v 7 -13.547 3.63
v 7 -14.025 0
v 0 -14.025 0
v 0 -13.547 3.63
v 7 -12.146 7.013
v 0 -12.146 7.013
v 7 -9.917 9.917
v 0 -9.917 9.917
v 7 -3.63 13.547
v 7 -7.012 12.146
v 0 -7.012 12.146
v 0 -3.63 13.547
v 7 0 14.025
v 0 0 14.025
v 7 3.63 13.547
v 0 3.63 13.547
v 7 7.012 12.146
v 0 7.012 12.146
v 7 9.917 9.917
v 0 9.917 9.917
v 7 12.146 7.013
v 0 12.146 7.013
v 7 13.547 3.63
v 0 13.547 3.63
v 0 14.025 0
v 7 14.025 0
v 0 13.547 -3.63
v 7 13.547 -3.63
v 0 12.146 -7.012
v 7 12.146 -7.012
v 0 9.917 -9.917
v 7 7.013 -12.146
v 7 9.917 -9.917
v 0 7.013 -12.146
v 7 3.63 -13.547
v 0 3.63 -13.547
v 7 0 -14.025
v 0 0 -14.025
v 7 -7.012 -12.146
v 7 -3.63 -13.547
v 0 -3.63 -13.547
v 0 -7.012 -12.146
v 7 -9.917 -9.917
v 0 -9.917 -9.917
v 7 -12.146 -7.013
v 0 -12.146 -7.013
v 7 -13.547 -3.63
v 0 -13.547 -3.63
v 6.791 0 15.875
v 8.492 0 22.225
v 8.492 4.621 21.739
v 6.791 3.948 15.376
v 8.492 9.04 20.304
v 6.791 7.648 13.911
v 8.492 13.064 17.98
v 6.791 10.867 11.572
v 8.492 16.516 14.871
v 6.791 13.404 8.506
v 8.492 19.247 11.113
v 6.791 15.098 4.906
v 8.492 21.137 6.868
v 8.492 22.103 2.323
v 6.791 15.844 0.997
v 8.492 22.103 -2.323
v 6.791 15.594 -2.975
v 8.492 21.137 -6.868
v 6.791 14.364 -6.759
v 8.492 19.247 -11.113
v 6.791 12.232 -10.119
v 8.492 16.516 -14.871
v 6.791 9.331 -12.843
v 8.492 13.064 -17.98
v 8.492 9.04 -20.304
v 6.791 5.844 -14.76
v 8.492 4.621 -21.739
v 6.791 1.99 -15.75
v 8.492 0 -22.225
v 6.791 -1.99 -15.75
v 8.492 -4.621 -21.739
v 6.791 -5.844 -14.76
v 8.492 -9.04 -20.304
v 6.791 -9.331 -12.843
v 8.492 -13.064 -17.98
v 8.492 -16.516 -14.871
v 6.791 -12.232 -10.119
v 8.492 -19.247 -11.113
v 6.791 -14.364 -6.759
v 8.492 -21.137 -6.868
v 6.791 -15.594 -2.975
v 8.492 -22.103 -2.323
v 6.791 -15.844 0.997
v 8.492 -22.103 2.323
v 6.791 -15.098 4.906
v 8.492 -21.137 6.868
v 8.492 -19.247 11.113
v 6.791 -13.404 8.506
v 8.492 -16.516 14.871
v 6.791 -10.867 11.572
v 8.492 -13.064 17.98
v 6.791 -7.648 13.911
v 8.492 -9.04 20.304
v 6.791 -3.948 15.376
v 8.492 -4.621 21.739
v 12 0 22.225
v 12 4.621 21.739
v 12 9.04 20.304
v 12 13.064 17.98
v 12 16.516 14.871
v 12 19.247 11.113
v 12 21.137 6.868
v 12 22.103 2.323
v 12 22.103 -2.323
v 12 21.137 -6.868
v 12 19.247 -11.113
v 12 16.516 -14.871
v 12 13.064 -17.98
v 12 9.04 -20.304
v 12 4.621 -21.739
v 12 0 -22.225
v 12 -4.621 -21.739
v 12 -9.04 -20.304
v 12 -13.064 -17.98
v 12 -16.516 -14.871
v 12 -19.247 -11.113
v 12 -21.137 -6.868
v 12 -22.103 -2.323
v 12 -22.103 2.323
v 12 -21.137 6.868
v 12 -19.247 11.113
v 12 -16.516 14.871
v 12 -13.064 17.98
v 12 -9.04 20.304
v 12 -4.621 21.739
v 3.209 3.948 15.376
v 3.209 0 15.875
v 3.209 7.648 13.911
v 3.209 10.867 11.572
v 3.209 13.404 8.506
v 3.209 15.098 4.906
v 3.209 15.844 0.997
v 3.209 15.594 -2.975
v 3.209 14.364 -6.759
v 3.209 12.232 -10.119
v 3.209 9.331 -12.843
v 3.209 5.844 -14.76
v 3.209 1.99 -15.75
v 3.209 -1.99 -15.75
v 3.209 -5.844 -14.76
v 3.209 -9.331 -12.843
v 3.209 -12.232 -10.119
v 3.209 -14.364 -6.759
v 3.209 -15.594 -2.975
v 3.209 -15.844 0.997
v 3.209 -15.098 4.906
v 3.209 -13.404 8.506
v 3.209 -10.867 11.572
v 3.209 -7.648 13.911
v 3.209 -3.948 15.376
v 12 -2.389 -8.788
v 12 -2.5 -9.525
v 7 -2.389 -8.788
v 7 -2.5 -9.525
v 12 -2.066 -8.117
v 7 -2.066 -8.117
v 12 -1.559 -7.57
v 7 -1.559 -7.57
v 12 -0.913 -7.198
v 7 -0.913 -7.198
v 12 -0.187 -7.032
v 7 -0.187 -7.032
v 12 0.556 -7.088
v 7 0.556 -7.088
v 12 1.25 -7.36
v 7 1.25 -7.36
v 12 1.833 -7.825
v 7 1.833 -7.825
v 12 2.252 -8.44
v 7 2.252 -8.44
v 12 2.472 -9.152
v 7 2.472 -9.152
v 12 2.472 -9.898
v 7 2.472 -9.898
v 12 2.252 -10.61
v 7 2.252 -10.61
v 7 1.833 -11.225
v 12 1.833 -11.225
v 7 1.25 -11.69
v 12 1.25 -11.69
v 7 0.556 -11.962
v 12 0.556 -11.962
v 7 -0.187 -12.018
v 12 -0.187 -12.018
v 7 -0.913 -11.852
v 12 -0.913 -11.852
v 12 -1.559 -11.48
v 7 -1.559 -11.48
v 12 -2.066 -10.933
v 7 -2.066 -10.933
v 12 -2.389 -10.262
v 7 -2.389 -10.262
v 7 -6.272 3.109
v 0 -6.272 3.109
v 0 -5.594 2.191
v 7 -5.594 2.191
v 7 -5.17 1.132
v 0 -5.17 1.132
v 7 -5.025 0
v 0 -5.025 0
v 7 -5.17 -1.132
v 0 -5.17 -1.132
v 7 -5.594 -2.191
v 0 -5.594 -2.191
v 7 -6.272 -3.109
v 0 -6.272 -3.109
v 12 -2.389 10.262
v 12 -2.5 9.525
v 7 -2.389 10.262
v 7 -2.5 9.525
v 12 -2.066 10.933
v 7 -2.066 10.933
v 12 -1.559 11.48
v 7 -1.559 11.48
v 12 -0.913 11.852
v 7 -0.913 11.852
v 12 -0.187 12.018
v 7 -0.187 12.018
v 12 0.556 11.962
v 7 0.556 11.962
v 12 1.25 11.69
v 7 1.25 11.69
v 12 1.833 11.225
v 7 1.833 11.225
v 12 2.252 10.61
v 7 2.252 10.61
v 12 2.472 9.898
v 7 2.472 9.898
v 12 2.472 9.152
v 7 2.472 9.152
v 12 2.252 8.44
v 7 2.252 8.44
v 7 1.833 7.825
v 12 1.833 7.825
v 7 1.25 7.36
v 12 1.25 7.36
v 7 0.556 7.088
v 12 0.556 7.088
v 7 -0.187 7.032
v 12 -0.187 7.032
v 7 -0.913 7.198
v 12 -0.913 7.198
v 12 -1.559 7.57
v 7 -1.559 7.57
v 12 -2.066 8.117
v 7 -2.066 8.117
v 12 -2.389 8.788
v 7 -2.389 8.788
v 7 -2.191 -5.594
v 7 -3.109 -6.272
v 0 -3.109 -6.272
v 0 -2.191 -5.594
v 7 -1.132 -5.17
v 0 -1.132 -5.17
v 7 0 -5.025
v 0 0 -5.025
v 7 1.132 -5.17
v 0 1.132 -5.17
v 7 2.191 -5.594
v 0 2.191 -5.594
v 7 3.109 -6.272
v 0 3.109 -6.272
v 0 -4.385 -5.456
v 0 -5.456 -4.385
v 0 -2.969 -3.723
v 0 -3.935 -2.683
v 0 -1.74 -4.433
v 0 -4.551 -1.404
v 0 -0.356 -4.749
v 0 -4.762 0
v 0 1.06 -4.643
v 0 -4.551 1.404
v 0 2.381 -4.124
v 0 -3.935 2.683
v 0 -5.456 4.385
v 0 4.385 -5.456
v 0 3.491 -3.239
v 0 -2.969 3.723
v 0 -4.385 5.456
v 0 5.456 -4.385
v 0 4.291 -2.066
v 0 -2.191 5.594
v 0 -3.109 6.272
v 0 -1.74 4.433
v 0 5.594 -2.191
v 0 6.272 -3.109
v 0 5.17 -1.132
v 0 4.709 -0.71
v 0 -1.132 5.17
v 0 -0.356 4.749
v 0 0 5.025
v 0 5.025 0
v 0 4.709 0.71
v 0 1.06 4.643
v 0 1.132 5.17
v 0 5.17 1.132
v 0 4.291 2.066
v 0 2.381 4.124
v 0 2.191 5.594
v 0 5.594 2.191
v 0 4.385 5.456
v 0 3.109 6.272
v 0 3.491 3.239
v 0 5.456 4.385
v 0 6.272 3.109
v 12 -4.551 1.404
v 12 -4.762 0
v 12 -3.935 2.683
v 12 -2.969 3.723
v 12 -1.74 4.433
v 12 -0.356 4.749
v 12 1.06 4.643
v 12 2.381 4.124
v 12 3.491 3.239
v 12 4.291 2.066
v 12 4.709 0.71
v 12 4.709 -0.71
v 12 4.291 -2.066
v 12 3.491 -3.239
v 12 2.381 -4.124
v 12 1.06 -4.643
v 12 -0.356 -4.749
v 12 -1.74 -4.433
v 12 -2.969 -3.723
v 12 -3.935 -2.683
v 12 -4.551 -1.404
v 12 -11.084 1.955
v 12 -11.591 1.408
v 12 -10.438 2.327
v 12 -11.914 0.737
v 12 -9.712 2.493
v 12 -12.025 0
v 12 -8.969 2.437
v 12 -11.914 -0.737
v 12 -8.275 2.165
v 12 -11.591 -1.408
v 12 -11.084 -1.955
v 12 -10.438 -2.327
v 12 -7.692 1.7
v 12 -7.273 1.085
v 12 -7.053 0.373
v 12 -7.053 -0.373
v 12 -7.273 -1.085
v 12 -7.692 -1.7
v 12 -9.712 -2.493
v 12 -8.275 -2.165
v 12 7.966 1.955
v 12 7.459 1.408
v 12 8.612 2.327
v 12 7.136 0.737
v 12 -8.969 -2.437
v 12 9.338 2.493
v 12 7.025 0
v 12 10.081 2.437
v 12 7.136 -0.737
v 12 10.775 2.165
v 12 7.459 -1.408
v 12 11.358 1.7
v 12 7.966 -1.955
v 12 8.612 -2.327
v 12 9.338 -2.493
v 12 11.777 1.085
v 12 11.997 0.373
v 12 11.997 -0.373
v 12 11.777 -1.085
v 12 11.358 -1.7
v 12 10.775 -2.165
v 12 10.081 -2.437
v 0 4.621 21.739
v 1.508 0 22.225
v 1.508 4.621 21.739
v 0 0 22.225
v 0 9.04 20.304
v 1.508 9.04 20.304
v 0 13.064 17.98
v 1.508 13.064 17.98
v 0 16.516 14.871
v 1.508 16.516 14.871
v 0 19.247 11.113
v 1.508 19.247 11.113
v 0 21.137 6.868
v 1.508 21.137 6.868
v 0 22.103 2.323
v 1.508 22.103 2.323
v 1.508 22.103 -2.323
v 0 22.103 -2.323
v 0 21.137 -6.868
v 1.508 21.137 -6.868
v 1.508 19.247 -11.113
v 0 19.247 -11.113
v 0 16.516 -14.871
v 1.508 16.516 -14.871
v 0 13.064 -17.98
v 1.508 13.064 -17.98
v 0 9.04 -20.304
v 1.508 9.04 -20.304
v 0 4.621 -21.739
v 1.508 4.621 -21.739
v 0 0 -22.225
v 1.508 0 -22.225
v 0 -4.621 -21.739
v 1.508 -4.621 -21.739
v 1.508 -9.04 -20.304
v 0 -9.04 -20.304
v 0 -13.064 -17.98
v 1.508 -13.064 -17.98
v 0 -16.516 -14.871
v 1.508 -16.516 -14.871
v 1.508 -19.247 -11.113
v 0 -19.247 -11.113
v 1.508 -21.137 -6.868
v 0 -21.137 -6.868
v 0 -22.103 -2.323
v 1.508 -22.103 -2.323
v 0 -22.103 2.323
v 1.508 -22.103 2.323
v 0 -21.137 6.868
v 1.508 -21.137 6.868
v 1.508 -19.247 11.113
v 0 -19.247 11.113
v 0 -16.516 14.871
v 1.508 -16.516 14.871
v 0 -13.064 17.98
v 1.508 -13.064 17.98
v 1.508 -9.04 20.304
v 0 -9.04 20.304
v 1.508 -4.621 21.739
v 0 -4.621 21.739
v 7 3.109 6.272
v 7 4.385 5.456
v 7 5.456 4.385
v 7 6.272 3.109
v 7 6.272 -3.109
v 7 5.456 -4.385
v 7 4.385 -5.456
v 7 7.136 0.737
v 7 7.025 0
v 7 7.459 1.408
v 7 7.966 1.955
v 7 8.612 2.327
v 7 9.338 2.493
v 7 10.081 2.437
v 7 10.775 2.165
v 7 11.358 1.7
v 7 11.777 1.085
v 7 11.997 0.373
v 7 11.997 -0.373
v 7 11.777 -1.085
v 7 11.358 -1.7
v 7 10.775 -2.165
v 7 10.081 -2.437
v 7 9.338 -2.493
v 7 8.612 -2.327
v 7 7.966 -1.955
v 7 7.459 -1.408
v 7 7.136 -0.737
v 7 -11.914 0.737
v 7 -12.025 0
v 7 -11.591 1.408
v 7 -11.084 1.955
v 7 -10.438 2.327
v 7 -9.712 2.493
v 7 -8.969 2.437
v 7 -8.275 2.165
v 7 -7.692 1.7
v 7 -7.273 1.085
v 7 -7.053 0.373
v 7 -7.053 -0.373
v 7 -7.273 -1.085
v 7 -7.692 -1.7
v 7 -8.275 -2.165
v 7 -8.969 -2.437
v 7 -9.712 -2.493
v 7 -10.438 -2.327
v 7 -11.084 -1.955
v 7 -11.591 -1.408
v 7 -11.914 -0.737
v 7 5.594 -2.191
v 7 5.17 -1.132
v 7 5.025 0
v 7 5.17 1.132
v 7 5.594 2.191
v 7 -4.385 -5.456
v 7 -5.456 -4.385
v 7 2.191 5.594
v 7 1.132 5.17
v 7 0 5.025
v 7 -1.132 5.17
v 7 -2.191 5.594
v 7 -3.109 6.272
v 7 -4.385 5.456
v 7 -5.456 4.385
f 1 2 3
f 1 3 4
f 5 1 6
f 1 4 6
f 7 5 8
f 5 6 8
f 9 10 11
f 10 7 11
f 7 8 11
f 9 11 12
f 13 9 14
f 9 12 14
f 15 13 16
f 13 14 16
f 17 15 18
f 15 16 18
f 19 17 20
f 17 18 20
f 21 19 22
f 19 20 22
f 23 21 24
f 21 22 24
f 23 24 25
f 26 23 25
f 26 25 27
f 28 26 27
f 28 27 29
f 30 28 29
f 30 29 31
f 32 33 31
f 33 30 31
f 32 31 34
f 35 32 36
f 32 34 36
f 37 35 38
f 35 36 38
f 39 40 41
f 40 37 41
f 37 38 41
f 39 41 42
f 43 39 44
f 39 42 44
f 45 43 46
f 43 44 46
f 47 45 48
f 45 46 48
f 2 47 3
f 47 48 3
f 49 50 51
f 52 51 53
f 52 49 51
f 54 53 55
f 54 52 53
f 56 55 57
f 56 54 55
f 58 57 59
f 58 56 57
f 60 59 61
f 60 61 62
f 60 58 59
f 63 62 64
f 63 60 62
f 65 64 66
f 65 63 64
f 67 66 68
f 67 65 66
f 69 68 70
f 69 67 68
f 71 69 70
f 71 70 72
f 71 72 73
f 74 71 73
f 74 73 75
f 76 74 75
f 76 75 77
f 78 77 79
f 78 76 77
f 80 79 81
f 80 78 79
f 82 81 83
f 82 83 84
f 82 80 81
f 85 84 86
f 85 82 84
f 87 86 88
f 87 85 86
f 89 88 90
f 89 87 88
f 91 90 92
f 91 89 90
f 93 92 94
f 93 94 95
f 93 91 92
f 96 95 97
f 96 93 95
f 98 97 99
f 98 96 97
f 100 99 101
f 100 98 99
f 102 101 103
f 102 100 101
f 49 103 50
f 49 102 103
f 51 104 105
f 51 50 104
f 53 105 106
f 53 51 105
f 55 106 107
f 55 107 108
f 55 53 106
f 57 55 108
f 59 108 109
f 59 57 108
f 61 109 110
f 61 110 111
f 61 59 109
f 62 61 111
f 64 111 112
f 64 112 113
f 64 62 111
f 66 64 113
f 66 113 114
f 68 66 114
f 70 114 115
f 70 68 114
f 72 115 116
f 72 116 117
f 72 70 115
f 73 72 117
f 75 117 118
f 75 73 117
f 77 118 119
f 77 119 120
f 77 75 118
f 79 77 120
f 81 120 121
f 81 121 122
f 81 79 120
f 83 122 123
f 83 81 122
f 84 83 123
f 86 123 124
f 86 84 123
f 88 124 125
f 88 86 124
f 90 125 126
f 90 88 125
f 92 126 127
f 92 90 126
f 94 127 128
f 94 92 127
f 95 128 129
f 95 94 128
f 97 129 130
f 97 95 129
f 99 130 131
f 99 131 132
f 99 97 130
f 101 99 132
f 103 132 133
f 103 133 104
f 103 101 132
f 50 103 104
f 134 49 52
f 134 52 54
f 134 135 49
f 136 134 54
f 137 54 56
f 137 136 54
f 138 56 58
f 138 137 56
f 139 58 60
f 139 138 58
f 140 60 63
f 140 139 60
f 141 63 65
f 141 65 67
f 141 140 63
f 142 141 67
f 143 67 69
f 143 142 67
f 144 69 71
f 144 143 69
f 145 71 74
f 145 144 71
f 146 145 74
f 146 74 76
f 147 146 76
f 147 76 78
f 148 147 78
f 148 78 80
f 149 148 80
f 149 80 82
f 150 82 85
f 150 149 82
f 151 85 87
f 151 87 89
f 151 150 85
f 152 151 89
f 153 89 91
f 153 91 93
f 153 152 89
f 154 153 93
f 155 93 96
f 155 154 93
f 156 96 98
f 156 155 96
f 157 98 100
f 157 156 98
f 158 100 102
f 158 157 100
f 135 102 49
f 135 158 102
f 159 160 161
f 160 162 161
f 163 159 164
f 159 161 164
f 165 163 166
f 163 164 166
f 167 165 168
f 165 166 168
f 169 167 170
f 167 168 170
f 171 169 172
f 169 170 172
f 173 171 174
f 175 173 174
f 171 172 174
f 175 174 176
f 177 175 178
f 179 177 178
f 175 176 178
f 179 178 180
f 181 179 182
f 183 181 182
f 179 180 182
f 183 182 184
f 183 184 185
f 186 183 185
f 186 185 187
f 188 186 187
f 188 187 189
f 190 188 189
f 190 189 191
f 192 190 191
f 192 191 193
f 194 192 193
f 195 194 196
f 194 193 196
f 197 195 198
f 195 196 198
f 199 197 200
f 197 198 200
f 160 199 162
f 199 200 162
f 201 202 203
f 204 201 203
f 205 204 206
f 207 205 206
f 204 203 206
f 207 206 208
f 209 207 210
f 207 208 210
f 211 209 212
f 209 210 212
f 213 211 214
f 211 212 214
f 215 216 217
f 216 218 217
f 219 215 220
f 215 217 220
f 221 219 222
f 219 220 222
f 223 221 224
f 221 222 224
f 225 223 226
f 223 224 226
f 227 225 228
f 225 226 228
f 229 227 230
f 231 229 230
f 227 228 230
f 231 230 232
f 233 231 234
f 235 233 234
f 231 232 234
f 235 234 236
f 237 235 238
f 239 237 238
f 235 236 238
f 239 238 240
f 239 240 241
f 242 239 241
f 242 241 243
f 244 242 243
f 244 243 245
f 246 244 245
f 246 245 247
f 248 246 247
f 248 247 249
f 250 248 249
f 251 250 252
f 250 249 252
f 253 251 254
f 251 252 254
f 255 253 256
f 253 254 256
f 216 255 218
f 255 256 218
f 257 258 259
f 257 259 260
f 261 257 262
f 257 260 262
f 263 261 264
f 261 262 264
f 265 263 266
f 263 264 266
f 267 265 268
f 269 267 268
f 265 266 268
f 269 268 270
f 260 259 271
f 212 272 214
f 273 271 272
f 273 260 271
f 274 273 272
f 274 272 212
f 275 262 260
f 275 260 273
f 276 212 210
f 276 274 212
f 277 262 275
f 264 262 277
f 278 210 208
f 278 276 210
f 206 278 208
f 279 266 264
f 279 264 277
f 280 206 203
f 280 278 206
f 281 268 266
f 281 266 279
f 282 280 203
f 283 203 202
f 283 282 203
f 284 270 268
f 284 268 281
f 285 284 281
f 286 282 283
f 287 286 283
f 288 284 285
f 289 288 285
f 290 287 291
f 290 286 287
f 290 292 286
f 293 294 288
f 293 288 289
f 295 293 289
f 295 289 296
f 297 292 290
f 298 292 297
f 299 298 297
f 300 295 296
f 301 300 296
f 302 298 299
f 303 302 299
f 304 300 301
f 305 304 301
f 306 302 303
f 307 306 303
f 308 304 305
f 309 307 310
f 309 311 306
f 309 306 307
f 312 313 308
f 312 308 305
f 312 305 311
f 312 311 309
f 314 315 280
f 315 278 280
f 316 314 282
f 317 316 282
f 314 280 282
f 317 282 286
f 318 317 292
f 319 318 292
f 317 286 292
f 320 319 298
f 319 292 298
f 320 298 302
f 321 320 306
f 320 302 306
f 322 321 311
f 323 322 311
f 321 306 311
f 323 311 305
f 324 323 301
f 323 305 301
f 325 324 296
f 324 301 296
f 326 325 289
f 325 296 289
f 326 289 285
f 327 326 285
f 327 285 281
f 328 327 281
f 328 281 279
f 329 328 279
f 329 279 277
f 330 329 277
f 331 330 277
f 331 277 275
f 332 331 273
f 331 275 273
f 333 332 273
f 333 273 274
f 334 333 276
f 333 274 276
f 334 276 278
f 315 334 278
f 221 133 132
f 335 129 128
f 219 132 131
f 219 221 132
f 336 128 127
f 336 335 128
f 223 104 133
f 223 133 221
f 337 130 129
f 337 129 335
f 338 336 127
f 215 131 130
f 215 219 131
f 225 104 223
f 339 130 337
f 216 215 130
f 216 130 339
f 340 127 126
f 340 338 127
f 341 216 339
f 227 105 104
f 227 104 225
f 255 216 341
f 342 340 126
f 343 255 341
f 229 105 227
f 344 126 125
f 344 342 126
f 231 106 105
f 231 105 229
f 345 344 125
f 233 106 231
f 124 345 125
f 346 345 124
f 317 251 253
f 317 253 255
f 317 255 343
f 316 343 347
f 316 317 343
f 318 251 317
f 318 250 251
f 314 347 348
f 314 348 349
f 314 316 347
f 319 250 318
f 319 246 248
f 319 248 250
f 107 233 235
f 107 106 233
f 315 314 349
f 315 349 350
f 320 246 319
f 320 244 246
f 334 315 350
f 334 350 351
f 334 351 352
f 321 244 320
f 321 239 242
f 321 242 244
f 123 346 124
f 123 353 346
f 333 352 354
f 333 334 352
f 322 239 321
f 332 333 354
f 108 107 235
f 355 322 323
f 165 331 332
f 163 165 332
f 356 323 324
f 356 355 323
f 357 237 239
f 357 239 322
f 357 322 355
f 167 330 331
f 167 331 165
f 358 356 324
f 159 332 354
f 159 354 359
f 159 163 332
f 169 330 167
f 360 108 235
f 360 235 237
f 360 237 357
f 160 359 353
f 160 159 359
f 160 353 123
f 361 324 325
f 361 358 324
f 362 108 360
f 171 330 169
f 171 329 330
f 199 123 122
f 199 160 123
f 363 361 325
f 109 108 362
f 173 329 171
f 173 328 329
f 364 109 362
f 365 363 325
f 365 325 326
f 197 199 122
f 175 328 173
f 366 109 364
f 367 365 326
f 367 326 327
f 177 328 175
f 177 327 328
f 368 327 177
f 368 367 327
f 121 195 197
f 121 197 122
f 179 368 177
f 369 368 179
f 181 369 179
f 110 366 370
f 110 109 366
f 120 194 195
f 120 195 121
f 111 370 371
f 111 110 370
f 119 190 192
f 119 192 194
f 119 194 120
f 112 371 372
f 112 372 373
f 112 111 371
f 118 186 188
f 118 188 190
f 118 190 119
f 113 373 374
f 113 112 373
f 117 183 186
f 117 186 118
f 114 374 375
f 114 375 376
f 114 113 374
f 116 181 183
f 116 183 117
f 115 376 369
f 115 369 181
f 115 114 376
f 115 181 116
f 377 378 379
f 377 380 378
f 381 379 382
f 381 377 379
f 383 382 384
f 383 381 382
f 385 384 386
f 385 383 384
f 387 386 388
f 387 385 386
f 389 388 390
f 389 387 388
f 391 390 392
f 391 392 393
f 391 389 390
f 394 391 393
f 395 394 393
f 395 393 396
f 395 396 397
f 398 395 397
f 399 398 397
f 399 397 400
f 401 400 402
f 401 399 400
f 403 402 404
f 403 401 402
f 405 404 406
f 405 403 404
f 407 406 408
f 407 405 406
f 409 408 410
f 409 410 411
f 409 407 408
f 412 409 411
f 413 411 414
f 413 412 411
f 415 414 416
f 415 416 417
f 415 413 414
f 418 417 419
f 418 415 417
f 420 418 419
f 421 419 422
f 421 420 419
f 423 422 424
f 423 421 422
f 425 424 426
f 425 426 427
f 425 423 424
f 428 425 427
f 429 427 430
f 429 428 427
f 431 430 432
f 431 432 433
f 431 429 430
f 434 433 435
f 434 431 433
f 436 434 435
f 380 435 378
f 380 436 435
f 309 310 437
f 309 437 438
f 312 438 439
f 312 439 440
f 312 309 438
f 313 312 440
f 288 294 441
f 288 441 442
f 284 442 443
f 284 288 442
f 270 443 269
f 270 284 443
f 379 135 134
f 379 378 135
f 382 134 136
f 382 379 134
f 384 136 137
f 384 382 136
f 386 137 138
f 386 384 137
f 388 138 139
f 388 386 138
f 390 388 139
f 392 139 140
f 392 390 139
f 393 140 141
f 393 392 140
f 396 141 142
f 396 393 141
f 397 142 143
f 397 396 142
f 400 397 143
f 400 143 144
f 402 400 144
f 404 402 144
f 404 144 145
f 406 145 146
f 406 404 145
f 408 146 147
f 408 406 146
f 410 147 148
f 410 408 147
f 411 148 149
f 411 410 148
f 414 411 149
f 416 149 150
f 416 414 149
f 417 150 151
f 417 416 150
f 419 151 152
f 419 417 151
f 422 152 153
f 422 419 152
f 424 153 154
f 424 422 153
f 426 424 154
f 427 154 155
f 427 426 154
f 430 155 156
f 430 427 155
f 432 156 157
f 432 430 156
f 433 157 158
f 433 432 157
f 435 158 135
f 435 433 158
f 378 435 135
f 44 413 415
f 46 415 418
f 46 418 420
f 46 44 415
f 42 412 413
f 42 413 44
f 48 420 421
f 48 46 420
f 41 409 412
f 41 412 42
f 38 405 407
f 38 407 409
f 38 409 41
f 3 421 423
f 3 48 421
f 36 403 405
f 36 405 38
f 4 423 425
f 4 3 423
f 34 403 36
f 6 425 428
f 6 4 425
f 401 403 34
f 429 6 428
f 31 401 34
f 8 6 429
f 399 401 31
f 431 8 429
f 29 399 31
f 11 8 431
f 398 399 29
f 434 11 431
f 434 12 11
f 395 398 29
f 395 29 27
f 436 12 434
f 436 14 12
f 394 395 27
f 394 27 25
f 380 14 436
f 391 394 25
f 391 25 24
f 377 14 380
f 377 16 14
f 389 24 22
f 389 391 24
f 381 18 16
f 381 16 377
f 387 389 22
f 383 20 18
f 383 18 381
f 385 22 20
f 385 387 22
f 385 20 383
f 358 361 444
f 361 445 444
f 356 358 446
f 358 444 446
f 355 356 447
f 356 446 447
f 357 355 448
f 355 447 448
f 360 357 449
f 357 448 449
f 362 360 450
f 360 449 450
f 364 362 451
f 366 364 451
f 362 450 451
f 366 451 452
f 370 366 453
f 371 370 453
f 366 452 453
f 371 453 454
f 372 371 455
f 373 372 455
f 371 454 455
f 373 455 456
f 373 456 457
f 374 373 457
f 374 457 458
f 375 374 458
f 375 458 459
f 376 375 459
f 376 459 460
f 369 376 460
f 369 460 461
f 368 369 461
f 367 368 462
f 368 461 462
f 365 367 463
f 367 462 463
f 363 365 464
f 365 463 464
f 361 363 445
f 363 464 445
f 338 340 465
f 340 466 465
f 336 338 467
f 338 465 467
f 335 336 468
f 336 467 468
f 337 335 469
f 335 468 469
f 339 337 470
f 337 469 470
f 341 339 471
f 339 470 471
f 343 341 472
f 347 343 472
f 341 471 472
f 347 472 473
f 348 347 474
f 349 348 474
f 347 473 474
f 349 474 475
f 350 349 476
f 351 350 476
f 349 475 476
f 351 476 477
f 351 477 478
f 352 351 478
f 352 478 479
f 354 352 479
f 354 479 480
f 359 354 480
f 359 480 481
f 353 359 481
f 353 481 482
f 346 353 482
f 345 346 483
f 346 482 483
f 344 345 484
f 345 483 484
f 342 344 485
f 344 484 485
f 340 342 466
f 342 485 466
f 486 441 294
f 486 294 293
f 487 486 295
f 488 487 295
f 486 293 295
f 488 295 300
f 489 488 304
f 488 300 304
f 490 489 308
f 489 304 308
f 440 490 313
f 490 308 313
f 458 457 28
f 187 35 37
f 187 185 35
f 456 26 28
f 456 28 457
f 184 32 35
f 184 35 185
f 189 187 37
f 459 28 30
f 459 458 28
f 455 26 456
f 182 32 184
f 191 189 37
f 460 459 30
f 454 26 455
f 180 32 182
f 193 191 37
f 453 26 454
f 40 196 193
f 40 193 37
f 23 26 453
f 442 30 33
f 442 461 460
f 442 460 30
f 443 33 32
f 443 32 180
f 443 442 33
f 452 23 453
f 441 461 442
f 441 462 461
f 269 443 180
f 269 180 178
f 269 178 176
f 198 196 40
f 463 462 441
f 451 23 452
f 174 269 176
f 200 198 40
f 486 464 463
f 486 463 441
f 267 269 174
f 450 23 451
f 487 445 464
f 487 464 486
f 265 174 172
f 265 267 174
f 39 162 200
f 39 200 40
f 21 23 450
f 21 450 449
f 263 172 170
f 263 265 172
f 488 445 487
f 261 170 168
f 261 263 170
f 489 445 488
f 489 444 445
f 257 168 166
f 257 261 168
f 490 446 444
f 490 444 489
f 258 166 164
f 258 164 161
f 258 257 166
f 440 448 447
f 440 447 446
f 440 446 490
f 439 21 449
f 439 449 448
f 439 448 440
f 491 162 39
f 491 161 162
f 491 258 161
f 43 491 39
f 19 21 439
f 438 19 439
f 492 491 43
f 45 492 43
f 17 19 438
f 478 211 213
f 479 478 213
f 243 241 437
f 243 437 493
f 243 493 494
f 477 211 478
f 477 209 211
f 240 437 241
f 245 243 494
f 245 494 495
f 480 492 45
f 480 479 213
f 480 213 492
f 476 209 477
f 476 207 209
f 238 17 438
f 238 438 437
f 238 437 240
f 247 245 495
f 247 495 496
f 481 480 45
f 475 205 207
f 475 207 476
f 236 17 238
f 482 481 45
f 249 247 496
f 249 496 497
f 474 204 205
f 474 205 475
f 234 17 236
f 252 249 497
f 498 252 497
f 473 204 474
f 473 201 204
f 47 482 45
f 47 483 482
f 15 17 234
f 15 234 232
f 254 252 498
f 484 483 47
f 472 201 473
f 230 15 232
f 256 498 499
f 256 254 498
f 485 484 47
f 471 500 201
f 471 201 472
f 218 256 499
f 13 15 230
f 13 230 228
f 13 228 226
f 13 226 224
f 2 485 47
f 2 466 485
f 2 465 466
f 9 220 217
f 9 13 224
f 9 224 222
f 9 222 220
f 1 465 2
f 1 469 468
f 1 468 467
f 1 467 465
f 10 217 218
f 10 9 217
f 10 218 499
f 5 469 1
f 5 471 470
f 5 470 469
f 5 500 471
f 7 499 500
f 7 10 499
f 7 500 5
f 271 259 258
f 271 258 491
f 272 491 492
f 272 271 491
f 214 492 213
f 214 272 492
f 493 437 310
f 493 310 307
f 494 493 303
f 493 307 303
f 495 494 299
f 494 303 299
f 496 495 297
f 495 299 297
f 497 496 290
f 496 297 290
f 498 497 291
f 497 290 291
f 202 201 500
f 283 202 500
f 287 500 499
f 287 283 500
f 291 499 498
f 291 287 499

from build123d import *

# Parameters (mm, degrees)
F2_R           = 2.5
F2_R_2         = 4.7625
F3_DEPTH       = 10.001
F5_D           = 5
F5_CBORE_D     = 9
F5_CBORE_DEPTH = 7
F6_R           = 14.025
F6_R_2         = 7
F7_DEPTH       = 7
F8_DEPTH       = 2


with BuildPart() as f1:
    # F0 (on Front) → F1 (revolve)
    with BuildSketch(Plane.XZ):
        Polygon((0, 22.225), (0, 0), (10, 0), (10, 22.225), (8.4925, 22.225), (6.7910226281, 15.875), (3.2089773719, 15.875), (1.5075, 22.225), align=None)
    revolve(axis=Axis((5, 0, 0), (-1, 0, 0)))

    # F2 (on face) → F3 (cut, through all)
    with BuildSketch(Plane(origin=(0, 0, 0), x_dir=(0, -1, 0), z_dir=(-1, 0, 0))):
        with Locations((0, 9.525)):
            Circle(F2_R)
        with Locations((9.525, 0)):
            Circle(F2_R)
        with Locations((0, -9.525)):
            Circle(F2_R)
        with Locations((-9.525, 0)):
            Circle(F2_R)
        Circle(F2_R_2)
    extrude(amount=-F3_DEPTH, mode=Mode.SUBTRACT)

    # F5 (through all)
    with Locations(Plane(origin=(0, 0, 0), x_dir=(0, -1, 0), z_dir=(-1, 0, 0))):
        with Locations((0, 9.525), (-9.525, 0), (0, -9.525), (9.525, 0)):
            CounterBoreHole(F5_D / 2, F5_CBORE_D / 2, F5_CBORE_DEPTH)

    # F6 (on face) → F7 (cut)
    with BuildSketch(Plane(origin=(0, 0, 0), x_dir=(0, -1, 0), z_dir=(-1, 0, 0))):
        Circle(F6_R)
        Circle(F6_R_2, mode=Mode.SUBTRACT)
    extrude(amount=-F7_DEPTH, mode=Mode.SUBTRACT)

    # F8 (add): a face of the model
    f8_faces = [f1.faces().sort_by_distance(p)[0] for p in [
        (10, 0, -21.5963820715),
    ]]
    extrude(f8_faces, amount=F8_DEPTH)


solid = f1.part
